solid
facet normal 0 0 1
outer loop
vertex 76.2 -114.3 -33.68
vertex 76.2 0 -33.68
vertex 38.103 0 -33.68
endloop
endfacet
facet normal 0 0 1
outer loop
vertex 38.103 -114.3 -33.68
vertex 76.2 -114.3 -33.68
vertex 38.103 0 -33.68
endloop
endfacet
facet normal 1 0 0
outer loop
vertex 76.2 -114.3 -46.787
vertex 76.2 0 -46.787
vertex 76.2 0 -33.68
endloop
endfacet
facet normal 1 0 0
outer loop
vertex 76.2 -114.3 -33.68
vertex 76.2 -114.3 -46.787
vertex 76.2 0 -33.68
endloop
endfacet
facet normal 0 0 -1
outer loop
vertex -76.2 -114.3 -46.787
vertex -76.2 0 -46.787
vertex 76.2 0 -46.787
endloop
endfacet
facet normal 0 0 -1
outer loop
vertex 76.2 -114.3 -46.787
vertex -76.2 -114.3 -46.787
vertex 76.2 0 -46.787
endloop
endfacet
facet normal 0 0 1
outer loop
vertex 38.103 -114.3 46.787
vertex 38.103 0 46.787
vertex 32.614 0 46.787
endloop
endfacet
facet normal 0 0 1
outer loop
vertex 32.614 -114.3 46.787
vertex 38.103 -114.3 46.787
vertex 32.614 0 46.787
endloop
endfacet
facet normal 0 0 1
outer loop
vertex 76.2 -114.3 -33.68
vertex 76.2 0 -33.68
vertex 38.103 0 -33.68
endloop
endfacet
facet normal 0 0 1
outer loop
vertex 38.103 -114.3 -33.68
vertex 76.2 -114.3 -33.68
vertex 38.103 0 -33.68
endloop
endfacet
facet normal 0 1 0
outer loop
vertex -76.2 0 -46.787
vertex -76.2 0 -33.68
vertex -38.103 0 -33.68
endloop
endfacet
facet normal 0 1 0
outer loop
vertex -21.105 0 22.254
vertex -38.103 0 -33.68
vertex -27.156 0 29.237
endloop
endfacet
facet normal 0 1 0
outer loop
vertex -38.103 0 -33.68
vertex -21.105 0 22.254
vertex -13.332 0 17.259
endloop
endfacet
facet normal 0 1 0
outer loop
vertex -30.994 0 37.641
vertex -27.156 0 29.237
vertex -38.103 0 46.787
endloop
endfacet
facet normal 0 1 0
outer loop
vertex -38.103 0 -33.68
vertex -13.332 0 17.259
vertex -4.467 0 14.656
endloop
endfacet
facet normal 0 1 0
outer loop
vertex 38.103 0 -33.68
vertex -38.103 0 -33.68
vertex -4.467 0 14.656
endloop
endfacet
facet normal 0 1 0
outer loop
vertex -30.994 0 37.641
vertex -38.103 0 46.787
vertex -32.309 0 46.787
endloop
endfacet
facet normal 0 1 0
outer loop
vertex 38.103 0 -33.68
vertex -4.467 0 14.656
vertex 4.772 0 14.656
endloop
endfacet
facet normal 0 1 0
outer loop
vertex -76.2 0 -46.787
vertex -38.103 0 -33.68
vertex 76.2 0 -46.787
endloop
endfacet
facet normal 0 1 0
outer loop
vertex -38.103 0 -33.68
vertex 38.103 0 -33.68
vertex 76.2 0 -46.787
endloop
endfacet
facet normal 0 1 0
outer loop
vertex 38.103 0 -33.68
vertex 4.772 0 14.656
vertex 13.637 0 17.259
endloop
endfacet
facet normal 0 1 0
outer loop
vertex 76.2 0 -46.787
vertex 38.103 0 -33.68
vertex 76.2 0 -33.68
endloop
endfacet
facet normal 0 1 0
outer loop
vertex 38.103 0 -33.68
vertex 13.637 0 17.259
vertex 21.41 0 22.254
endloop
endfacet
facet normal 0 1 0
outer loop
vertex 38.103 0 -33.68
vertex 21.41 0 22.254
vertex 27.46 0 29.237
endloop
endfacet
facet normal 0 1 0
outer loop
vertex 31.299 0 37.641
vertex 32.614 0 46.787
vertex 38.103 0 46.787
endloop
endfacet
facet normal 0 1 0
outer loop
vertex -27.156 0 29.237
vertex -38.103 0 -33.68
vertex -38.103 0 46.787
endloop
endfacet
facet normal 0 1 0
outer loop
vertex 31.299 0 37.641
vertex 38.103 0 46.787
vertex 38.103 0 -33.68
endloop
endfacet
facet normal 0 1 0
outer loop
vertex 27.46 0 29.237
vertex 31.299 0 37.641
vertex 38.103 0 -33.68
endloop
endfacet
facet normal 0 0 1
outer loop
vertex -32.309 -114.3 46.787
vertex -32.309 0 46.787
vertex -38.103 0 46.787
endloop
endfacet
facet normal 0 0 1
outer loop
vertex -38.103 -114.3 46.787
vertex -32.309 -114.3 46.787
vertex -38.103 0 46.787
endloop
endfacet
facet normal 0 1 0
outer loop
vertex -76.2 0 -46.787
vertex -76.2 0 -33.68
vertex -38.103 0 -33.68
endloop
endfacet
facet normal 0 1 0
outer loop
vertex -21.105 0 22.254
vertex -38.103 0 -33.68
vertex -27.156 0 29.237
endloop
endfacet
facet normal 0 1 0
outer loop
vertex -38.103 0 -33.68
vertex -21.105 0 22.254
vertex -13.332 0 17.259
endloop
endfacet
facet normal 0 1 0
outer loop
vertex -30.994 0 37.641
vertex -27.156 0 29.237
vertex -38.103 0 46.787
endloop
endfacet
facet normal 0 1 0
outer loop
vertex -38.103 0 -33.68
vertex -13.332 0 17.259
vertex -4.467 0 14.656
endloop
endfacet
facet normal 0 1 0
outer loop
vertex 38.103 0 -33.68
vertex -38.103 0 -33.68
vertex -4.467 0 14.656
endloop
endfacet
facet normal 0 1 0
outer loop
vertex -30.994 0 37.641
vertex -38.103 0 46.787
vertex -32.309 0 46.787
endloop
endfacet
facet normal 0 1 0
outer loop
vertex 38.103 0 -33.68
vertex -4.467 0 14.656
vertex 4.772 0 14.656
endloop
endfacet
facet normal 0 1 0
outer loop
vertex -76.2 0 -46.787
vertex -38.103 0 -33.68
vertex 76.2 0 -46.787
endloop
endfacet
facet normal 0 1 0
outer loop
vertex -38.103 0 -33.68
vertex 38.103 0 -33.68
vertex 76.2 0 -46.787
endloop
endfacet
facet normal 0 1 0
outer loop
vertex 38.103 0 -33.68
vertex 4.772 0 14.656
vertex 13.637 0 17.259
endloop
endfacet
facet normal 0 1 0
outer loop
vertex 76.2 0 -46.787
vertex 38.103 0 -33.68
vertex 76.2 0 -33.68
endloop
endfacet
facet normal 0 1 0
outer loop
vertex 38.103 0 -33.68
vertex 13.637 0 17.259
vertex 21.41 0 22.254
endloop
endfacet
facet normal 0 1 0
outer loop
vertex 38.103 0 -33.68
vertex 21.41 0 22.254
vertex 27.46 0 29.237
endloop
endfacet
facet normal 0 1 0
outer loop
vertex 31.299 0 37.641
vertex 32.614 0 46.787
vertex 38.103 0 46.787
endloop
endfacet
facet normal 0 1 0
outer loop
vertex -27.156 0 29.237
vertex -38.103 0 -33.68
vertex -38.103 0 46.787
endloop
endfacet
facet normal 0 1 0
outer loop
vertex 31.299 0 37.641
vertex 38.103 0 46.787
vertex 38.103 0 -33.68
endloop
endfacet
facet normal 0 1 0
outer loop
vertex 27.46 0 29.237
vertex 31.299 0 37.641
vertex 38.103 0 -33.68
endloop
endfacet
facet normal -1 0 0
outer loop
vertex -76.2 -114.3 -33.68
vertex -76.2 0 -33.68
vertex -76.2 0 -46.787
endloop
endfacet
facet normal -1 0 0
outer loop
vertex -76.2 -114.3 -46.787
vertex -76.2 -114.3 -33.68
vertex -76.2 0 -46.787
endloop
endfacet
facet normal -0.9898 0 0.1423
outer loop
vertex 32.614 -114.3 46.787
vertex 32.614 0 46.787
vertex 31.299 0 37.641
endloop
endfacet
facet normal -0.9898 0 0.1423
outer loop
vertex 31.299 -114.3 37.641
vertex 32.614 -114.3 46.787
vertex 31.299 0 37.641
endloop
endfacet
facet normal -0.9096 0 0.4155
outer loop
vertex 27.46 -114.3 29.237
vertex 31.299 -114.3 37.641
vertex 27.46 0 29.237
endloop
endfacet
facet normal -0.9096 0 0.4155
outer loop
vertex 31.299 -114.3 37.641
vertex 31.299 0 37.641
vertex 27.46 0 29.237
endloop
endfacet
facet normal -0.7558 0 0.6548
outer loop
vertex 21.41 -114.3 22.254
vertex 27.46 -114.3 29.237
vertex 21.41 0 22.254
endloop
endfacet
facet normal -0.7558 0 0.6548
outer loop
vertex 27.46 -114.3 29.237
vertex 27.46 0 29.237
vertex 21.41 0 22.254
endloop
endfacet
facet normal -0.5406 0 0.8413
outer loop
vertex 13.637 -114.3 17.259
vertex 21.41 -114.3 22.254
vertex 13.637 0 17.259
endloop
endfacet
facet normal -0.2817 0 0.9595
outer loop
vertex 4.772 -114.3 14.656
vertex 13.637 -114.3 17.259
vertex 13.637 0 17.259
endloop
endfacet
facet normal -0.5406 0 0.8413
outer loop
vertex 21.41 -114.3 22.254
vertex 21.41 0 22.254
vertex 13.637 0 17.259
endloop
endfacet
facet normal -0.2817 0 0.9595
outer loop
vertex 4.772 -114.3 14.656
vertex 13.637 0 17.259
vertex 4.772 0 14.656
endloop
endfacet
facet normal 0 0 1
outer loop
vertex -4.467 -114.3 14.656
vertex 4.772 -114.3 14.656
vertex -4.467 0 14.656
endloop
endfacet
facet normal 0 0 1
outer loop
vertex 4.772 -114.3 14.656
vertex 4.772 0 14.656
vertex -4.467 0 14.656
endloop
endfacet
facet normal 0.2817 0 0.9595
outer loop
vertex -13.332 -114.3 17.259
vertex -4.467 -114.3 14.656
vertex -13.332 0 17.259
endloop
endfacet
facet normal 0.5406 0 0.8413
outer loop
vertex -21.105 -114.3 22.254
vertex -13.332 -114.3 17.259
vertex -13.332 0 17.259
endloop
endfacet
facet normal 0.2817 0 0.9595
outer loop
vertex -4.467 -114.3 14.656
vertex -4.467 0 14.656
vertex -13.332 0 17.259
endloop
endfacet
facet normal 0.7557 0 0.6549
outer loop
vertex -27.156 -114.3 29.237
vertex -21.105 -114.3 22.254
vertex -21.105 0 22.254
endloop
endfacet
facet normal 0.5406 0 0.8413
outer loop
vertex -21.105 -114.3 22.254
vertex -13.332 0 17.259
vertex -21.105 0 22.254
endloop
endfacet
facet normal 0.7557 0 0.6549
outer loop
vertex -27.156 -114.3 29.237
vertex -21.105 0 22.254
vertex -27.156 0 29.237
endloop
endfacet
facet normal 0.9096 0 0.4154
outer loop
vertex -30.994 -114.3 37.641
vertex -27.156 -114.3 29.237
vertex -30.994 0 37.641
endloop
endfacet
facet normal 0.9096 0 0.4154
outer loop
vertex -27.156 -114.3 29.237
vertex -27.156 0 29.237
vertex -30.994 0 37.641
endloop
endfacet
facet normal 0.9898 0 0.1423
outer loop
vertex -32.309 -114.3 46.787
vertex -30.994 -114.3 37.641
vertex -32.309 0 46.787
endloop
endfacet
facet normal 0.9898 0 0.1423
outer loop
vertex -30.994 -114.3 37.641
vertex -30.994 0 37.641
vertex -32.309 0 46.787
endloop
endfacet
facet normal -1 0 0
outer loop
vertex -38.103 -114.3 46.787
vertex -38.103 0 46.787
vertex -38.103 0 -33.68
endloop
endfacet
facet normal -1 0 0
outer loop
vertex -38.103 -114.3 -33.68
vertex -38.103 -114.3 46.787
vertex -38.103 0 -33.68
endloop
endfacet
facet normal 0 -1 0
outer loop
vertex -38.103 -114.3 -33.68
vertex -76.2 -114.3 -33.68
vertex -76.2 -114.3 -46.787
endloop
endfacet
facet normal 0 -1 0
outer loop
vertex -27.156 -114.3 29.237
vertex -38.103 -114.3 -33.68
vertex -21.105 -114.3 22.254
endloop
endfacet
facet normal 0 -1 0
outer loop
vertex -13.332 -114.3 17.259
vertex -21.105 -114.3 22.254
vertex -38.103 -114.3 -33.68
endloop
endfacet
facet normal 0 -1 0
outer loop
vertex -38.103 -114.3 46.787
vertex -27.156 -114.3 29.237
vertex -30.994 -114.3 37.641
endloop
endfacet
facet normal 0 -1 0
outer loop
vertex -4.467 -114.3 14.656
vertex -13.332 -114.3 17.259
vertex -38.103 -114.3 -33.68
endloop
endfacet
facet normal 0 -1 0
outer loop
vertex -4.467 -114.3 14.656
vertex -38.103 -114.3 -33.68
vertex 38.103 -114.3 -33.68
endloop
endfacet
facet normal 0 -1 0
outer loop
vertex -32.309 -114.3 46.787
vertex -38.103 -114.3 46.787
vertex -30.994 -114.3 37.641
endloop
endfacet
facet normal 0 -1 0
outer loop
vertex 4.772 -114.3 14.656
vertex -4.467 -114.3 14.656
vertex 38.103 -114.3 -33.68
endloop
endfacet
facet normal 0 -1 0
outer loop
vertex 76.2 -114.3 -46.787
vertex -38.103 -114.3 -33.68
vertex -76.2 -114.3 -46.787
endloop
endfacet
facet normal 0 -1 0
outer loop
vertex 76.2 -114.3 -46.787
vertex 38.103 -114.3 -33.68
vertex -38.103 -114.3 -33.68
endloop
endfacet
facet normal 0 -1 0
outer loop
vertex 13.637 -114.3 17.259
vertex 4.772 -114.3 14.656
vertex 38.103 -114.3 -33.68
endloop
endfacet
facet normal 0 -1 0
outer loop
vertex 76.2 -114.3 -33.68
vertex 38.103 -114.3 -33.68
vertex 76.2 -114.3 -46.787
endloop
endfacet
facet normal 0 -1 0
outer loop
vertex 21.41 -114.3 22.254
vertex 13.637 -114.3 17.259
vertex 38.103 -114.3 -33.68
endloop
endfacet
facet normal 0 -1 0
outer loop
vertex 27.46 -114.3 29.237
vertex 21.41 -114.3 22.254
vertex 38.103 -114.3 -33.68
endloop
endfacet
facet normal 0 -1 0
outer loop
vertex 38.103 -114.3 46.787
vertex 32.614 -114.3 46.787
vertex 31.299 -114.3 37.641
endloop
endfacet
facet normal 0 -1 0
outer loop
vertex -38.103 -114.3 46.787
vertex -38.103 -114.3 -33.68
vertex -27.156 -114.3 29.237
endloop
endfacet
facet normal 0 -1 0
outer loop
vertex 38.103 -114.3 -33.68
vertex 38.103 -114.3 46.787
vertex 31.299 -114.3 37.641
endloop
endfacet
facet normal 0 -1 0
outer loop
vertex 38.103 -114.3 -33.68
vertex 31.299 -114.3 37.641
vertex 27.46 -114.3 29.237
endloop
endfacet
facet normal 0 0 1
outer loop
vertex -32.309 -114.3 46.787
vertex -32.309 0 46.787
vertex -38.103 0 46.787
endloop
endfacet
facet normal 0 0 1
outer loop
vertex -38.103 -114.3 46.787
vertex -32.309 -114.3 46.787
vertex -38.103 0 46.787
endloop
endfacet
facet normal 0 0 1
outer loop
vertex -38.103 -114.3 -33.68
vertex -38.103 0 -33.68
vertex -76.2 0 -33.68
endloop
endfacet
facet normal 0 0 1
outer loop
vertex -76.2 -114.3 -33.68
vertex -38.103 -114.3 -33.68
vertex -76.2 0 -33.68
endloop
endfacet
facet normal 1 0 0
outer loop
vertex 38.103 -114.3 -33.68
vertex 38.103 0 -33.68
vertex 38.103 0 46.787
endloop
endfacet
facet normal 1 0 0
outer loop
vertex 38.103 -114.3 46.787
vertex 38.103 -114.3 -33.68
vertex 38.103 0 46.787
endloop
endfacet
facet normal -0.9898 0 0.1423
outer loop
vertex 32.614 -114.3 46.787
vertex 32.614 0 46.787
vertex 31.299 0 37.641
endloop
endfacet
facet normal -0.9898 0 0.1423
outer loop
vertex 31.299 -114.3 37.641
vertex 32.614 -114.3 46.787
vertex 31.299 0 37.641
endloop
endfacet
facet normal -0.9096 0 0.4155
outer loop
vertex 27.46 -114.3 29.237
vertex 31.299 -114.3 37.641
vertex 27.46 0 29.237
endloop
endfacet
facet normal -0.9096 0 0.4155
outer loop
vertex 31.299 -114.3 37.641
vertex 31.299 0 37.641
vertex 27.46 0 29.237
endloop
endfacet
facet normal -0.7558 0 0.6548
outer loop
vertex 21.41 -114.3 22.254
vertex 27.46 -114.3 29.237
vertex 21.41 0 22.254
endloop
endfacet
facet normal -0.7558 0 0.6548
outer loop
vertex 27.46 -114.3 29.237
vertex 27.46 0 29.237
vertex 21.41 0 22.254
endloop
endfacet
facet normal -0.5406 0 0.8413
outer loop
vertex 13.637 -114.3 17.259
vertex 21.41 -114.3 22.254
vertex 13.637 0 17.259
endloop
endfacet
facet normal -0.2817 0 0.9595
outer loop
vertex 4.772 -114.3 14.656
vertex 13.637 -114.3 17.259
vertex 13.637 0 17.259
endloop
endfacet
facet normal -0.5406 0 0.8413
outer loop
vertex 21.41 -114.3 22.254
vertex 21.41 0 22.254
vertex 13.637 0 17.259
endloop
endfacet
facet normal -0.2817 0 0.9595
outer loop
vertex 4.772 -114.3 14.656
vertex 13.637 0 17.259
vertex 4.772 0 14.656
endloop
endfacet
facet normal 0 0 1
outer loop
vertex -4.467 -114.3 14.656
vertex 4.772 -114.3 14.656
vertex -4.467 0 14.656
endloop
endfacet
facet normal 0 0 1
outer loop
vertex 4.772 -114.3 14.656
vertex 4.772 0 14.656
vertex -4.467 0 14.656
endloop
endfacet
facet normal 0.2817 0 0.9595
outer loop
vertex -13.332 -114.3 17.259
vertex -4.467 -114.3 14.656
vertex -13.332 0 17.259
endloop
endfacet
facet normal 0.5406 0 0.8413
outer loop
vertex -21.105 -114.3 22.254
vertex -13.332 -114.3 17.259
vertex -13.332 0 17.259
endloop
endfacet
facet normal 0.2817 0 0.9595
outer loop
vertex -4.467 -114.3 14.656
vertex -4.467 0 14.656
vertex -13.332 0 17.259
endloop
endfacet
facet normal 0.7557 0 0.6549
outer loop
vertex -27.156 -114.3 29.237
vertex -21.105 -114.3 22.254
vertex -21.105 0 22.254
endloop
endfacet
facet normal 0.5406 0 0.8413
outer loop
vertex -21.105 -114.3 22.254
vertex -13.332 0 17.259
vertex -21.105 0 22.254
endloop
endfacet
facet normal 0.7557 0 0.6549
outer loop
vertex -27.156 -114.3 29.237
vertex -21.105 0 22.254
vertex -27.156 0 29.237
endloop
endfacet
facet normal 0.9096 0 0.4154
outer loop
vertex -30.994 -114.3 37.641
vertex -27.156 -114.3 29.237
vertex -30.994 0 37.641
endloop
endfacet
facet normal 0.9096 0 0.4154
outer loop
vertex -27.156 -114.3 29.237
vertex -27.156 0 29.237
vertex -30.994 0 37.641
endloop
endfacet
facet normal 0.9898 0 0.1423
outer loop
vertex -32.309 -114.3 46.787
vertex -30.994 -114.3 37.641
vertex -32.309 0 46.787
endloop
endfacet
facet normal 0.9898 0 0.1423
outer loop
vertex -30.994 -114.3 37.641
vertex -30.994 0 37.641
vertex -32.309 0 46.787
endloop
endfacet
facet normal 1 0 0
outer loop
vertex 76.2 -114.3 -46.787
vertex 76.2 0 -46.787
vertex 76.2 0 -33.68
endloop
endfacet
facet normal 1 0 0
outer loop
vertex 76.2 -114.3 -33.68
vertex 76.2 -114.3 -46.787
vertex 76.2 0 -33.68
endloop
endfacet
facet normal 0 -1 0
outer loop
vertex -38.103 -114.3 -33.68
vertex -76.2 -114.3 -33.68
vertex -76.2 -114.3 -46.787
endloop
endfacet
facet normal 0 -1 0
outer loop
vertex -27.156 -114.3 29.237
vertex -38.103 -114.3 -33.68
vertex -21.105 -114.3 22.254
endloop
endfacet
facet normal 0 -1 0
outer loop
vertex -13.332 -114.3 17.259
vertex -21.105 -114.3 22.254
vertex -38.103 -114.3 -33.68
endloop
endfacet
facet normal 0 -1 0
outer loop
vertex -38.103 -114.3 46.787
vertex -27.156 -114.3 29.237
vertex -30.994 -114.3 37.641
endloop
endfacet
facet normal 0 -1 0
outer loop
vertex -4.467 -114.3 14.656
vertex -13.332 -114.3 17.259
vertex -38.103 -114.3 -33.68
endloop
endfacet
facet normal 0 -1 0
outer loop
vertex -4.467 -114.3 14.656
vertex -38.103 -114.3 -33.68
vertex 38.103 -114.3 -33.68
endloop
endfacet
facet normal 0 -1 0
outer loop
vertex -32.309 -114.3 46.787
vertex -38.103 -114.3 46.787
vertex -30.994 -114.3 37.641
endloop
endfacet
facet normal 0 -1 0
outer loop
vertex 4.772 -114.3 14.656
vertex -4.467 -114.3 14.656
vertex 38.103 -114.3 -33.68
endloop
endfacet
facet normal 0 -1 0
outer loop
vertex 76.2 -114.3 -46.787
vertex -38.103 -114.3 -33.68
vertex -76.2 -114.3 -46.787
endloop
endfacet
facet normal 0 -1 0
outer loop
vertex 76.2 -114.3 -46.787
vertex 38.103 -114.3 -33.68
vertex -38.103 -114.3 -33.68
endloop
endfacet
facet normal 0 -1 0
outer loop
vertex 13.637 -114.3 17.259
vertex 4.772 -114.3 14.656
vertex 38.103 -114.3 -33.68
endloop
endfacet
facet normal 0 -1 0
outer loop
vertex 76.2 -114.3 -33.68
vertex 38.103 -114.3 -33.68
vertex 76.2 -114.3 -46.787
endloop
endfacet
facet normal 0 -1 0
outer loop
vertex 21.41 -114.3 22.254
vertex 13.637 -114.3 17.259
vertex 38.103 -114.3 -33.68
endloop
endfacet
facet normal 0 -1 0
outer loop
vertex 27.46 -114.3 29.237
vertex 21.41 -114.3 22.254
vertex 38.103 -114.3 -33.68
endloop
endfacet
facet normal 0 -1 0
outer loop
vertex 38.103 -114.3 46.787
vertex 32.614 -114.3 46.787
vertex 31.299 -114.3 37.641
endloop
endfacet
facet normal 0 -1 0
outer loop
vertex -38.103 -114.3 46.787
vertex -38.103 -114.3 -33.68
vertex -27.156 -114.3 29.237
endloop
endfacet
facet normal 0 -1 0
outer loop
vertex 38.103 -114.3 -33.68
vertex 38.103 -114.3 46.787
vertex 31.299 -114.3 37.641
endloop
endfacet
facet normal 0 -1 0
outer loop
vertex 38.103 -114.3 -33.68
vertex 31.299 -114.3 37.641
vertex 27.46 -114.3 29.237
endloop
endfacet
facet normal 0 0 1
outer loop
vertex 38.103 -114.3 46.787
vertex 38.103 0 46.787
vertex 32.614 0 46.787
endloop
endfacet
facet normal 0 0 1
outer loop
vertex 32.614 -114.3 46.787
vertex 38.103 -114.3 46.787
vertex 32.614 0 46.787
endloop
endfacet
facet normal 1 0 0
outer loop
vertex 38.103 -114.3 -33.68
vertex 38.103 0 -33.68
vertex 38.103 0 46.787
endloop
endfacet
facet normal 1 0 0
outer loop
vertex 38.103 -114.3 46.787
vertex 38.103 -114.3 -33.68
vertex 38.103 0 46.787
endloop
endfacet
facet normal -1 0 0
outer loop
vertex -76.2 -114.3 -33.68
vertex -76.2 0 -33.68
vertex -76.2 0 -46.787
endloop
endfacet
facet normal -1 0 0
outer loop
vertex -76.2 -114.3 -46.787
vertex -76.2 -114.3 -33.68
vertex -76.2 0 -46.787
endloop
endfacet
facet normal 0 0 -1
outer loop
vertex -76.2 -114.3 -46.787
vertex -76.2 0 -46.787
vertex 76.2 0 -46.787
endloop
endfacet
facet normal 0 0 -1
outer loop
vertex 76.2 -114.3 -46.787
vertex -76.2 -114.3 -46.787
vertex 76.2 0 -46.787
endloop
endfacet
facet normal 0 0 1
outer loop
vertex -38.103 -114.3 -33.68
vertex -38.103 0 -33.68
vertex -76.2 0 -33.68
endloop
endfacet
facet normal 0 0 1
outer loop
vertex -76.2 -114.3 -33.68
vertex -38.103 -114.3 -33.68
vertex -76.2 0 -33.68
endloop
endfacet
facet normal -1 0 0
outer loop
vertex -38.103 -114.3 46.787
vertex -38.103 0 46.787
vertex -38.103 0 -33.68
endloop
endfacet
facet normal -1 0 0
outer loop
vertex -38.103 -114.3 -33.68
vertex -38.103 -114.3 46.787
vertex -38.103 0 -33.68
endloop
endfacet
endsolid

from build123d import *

# Parameters (mm, degrees)
F1_DEPTH = 114.3
F2_DEPTH = 114.3


# Not quite as in the source:
# - a feature names something its author has since deleted; it is built from what else it names


with BuildPart() as f1:
    # F0 (on Front) → F1 (new body)
    with BuildSketch(Plane.XZ):
        with BuildLine():
            Line((-32.3088020086, 46.7868000269), (-38.1029994101, 46.7868000269))
            Line((-38.1029994101, 46.7868000269), (-38.1029994101, -33.6804017425))
            Line((-38.1029994101, -33.6804017425), (-76.2000009418, -33.6804017425))
            Line((-76.2000009418, -33.6804017425), (-76.2000009418, -46.7868000269))
            Line((-76.2000009418, -46.7868000269), (-38.1029994101, -46.7868000269))
            Line((-38.1029994101, -46.7868000269), (38.1029994101, -46.7868000269))
            Line((38.1029994101, -46.7868000269), (76.2000009418, -46.7868000269))
            Line((76.2000009418, -46.7868000269), (76.2000009418, -33.6804017425))
            Line((76.2000009418, -33.6804017425), (38.1029994101, -33.6804017425))
            Line((38.1029994101, -33.6804017425), (38.1029994101, 46.7868000269))
            Line((38.1029994101, 46.7868000269), (32.6135978103, 46.7868000269))
            ThreePointArc((32.6135978103, 46.7868000269), (0.1523979008, 14.3256001174), (-32.3088020086, 46.7868000269))
        make_face()
    extrude(amount=F1_DEPTH)


with BuildPart() as f2:
    # F0 (on Front) → F2 (new body)
    with BuildSketch(Plane.XZ):
        with BuildLine():
            Line((-32.3088020086, 46.7868000269), (-38.1029994101, 46.7868000269))
            Line((-38.1029994101, 46.7868000269), (-38.1029994101, -33.6804017425))
            Line((-38.1029994101, -33.6804017425), (-76.2000009418, -33.6804017425))
            Line((-76.2000009418, -33.6804017425), (-76.2000009418, -46.7868000269))
            Line((-76.2000009418, -46.7868000269), (-38.1029994101, -46.7868000269))
            Line((-38.1029994101, -46.7868000269), (38.1029994101, -46.7868000269))
            Line((38.1029994101, -46.7868000269), (76.2000009418, -46.7868000269))
            Line((76.2000009418, -46.7868000269), (76.2000009418, -33.6804017425))
            Line((76.2000009418, -33.6804017425), (38.1029994101, -33.6804017425))
            Line((38.1029994101, -33.6804017425), (38.1029994101, 46.7868000269))
            Line((38.1029994101, 46.7868000269), (32.6135978103, 46.7868000269))
            ThreePointArc((32.6135978103, 46.7868000269), (0.1523979008, 14.3256001174), (-32.3088020086, 46.7868000269))
        make_face()
    extrude(amount=F2_DEPTH)


solid = Compound([f1.part, f2.part])
